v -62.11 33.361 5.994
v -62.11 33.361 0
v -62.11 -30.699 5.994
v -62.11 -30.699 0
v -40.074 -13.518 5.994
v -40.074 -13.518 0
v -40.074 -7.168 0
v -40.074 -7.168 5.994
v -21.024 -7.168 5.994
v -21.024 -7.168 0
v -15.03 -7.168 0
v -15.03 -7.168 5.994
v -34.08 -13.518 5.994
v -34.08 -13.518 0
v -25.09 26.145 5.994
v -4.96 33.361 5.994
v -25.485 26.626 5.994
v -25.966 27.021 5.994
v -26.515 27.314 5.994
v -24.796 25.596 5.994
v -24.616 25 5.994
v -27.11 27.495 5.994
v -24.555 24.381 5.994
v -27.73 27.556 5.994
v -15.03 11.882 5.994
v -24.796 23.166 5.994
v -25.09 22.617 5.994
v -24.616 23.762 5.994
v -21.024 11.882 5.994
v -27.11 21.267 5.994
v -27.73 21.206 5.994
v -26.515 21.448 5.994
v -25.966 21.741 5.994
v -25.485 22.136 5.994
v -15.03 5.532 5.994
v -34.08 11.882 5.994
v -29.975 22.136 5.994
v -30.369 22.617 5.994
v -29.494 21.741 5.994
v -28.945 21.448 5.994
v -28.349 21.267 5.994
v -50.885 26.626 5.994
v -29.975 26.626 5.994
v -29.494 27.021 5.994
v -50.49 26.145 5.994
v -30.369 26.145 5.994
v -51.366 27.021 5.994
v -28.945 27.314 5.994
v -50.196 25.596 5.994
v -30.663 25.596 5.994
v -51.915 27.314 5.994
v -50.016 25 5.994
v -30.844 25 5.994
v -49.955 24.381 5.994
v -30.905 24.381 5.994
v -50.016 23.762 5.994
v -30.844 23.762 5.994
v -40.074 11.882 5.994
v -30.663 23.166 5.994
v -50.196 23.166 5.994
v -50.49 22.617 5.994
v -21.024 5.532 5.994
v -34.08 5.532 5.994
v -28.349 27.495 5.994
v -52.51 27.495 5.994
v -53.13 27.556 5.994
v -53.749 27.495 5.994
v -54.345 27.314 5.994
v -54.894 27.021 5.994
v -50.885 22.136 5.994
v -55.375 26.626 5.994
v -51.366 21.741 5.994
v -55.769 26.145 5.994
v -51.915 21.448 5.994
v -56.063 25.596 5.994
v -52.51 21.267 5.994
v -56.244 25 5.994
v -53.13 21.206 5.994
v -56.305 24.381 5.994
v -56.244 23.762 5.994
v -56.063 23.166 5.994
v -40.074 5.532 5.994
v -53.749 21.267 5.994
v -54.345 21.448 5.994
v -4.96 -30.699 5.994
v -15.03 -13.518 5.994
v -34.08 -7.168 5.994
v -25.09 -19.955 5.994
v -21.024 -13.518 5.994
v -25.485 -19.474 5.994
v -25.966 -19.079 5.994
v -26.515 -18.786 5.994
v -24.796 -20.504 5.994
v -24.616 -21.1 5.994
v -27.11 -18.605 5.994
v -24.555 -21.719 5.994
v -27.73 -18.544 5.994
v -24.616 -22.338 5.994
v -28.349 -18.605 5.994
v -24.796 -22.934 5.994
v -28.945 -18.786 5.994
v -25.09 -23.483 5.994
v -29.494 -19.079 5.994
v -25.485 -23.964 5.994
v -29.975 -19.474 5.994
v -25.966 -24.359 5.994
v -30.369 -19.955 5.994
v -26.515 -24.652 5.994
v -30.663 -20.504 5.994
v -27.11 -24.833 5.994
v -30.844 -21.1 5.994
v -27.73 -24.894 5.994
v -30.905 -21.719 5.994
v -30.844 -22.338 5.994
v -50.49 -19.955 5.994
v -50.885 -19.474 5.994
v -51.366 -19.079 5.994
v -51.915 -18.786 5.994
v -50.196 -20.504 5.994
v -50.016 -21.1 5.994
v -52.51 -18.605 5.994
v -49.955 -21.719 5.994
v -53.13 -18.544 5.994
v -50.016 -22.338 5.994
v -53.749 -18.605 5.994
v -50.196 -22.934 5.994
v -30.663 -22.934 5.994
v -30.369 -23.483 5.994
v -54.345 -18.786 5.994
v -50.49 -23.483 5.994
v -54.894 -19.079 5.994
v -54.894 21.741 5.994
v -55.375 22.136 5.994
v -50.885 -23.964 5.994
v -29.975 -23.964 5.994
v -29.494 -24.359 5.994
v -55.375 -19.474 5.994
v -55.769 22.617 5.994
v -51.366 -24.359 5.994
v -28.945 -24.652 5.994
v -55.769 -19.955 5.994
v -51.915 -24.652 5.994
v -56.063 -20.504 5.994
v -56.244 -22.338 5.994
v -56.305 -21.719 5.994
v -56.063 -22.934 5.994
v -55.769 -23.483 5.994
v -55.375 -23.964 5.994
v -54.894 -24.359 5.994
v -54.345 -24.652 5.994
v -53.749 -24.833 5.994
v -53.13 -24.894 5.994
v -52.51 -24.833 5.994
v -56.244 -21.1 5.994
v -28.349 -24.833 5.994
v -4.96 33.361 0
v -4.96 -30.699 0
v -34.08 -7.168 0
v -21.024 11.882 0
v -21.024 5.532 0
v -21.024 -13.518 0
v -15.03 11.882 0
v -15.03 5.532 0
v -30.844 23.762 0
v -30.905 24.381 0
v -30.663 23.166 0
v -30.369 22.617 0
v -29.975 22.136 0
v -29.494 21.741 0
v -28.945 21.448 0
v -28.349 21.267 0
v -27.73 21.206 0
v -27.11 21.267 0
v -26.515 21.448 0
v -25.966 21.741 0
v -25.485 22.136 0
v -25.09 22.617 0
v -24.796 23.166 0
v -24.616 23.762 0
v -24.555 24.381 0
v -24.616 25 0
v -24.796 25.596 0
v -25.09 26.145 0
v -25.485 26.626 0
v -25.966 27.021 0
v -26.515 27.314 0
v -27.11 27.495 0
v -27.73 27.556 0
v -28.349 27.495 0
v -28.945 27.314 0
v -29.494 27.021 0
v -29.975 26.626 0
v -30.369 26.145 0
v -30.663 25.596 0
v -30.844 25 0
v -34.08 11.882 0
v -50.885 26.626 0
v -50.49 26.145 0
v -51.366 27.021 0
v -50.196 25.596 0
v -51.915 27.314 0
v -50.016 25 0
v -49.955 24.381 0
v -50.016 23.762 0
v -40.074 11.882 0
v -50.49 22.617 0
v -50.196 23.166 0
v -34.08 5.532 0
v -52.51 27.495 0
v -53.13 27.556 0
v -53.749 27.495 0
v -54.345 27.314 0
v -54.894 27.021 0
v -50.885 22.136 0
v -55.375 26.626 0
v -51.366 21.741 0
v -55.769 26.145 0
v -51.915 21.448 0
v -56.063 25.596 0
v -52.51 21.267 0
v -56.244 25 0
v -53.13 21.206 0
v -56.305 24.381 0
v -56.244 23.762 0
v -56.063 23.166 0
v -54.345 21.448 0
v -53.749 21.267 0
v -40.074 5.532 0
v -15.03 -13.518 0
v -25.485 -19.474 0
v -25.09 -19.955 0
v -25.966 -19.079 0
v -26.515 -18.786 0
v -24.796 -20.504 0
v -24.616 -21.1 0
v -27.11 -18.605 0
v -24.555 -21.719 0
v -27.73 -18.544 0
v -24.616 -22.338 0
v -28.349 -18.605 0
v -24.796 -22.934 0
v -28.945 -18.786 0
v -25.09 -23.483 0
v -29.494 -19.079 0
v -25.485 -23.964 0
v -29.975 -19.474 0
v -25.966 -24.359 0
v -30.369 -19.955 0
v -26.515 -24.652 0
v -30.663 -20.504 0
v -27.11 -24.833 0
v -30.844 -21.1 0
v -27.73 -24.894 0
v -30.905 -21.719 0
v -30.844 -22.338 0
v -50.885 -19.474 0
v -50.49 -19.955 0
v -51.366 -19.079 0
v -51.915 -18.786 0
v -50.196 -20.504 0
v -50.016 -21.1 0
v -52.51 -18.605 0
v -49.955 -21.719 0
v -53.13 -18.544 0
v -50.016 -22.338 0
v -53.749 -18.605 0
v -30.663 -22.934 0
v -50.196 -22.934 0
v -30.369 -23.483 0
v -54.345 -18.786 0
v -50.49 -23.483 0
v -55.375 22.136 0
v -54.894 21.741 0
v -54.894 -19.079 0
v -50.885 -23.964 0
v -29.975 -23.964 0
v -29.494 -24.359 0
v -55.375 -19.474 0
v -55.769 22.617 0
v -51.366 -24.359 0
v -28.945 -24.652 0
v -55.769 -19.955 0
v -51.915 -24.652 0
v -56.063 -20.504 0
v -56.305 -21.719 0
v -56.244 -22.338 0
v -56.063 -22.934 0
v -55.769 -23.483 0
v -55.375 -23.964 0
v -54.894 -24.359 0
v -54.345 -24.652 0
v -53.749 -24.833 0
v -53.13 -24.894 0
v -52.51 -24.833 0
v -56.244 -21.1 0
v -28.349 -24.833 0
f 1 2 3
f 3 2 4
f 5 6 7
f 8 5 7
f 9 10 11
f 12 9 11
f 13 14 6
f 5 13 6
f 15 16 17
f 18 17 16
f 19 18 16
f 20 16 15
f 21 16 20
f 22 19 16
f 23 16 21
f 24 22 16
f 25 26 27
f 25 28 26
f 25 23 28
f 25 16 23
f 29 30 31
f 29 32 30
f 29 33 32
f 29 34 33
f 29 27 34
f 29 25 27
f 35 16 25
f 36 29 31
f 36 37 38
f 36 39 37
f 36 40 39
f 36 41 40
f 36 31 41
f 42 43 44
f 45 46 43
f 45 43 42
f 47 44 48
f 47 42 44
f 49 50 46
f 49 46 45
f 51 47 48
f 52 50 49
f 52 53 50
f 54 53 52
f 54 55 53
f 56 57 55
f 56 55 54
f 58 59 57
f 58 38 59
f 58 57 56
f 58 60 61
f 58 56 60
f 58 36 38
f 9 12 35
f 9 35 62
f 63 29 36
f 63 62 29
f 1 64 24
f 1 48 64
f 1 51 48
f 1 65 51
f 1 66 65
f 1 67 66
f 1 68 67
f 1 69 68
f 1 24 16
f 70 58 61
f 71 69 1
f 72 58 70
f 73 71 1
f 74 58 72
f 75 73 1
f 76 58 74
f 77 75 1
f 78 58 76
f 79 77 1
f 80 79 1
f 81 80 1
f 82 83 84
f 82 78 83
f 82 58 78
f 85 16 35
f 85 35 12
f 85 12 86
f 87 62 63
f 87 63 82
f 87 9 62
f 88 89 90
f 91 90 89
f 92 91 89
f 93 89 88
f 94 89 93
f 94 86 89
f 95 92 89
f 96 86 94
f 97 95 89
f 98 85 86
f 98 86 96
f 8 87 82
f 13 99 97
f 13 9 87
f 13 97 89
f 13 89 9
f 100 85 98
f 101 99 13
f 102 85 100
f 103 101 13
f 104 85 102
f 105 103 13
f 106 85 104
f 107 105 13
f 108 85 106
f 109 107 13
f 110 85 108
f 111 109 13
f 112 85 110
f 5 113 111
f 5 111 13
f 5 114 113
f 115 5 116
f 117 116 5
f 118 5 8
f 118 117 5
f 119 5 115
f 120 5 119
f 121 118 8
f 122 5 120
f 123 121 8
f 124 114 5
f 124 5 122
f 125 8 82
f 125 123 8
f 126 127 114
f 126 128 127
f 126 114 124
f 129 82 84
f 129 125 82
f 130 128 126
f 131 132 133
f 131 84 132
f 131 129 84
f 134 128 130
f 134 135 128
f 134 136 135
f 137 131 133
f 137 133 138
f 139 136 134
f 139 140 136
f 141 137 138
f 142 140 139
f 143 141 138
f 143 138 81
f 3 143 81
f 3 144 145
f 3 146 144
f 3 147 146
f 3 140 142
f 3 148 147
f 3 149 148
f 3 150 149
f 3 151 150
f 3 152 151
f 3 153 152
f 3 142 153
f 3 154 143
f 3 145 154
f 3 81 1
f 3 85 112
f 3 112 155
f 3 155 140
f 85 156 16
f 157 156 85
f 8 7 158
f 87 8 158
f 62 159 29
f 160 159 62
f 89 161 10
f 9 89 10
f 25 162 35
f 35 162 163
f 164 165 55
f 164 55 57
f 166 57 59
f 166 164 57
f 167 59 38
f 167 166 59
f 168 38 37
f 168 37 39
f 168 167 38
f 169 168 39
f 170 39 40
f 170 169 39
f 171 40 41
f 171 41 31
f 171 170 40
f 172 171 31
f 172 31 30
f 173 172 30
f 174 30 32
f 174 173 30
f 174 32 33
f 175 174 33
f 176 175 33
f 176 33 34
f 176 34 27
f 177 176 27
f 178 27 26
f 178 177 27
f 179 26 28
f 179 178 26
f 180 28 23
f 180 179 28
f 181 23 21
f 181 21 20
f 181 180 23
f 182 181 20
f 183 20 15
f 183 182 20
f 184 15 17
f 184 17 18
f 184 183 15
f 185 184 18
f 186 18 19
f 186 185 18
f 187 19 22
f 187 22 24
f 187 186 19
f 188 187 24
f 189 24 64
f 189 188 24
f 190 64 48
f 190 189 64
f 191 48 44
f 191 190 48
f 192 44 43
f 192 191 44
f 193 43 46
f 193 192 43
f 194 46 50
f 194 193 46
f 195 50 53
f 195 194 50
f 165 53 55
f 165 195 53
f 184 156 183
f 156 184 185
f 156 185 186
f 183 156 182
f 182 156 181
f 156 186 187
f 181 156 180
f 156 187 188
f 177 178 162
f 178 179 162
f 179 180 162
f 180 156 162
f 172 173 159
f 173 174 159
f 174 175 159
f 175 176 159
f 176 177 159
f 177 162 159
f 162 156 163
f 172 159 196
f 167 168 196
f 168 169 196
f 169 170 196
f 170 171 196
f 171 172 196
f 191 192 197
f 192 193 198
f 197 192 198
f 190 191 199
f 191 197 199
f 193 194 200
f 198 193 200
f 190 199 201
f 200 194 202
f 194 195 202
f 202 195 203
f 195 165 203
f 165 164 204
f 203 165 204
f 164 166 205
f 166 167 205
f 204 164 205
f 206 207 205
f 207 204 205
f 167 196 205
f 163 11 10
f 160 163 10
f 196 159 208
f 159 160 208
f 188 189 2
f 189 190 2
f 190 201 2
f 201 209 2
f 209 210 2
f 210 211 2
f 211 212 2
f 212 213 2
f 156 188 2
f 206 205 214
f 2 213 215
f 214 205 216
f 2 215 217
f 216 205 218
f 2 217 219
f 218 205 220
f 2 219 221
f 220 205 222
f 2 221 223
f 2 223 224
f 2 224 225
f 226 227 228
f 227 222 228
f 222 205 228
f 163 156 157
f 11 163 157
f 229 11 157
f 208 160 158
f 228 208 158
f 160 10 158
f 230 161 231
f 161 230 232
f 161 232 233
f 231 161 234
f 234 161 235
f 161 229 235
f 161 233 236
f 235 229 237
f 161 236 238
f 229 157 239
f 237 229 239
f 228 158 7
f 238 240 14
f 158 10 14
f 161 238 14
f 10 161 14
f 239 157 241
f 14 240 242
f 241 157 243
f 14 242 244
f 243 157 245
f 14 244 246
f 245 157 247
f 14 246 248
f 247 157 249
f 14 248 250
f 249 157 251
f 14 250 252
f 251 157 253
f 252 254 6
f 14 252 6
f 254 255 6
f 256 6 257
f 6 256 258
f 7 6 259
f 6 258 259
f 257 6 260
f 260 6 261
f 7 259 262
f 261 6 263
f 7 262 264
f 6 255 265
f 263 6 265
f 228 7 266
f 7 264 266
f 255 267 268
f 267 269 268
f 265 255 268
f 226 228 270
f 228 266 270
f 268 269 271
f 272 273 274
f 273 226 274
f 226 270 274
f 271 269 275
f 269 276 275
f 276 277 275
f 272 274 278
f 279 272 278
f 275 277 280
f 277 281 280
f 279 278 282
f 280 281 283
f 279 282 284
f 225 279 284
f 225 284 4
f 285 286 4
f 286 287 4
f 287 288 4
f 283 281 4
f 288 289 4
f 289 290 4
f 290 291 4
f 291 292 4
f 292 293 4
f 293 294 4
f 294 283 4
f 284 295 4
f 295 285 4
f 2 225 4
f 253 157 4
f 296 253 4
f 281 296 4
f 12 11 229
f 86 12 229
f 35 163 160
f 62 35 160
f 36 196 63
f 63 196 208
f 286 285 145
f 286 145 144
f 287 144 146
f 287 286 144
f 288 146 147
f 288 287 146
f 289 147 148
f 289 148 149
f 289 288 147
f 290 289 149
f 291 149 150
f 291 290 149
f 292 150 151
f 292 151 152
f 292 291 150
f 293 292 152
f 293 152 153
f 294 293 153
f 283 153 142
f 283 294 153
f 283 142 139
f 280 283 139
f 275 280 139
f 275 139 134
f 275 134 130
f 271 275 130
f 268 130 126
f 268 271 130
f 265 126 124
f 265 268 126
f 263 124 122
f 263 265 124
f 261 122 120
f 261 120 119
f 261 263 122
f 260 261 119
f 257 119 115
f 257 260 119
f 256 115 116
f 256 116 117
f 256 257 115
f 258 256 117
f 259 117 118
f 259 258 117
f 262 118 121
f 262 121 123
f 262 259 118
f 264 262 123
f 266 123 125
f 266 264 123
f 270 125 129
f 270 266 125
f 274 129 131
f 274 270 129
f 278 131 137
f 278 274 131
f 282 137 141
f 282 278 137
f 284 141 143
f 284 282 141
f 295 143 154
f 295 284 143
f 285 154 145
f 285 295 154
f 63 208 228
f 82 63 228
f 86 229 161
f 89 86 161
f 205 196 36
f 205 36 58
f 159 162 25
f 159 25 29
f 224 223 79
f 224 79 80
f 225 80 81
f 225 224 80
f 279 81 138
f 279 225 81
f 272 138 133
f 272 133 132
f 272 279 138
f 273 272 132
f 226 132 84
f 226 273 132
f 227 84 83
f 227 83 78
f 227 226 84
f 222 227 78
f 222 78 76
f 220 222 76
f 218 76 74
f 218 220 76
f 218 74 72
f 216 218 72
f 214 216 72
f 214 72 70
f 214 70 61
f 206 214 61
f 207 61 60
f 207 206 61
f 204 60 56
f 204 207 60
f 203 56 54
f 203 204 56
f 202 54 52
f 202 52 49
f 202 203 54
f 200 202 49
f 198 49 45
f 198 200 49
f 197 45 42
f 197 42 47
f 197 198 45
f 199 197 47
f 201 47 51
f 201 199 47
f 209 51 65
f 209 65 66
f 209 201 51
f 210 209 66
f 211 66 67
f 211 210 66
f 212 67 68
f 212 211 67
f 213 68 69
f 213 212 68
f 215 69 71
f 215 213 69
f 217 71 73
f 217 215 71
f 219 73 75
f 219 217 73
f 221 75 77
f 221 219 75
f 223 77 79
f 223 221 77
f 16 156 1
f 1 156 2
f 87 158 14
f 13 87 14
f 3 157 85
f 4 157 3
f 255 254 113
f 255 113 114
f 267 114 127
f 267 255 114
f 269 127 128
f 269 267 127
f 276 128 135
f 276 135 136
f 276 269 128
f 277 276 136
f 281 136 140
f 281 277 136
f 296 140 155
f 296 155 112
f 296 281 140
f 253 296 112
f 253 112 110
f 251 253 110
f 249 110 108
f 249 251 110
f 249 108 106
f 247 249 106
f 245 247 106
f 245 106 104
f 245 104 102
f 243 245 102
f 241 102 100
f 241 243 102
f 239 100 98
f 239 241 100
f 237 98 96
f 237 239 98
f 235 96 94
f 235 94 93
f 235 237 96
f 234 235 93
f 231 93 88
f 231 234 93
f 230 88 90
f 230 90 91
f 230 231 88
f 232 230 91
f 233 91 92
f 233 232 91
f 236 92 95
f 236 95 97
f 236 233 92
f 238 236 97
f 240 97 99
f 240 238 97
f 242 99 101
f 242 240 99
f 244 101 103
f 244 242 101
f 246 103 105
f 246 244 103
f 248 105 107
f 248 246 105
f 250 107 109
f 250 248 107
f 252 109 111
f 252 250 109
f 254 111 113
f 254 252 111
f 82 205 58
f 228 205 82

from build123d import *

# Parameters (mm, degrees)
SKETCH1_W           = 57.15
SKETCH1_H           = 64.060512242
SKETCH1_R           = 3.175
SKETCH1_W_2         = 5.9944
SKETCH1_H_2         = 6.35
BOSS_EXTRUDE1_DEPTH = 5.9944


with BuildPart() as part:
    # Sketch1 → Boss-Extrude1 (new body)
    with BuildSketch(Plane(origin=(0, 0, 0), x_dir=(-1, 0, 0), z_dir=(0, 0, 1))):
        with Locations((33.534836058, -1.33105998)):
            Rectangle(SKETCH1_W, SKETCH1_H)
        with Locations((53.129579937, -24.38105998)):
            Circle(SKETCH1_R, mode=Mode.SUBTRACT)
        with Locations((53.129579937, 21.71894002)):
            Circle(SKETCH1_R, mode=Mode.SUBTRACT)
        with Locations((27.729579937, -24.38105998)):
            Circle(SKETCH1_R, mode=Mode.SUBTRACT)
        with Locations((27.729579937, 21.71894002)):
            Circle(SKETCH1_R, mode=Mode.SUBTRACT)
        with Locations((37.076779937, -8.707018437)):
            Rectangle(SKETCH1_W_2, SKETCH1_H_2, mode=Mode.SUBTRACT)
        Polygon((15.029579937, 13.517981563), (21.023979937, 13.517981563), (21.023979937, 7.36894002), (21.023979937, 7.167981563), (15.029579937, 7.167981563), (15.029579937, 7.36894002), align=None, mode=Mode.SUBTRACT)
        with Locations((18.026779937, -8.707018437)):
            Rectangle(SKETCH1_W_2, SKETCH1_H_2, mode=Mode.SUBTRACT)
        Polygon((40.073979937, 7.36894002), (40.073979937, 7.167981563), (34.079579937, 7.167981563), (34.079579937, 7.36894002), (34.079579937, 13.517981563), (40.073979937, 13.517981563), align=None, mode=Mode.SUBTRACT)
    extrude(amount=BOSS_EXTRUDE1_DEPTH)


solid = part.part
